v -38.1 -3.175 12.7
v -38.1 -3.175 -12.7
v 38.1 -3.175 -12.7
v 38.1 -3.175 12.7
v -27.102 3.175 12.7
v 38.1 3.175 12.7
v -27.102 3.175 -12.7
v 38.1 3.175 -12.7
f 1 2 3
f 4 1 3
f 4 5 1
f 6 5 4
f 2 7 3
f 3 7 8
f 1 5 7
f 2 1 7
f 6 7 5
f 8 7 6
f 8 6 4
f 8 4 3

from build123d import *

# Parameters (mm, degrees)
SKETCH1_W           = 76.2
SKETCH1_H           = 25.4
BOSS_EXTRUDE1_DEPTH = 3.175
CHAMFER8_SIZE2      = 10.998522628
CHAMFER8_SIZE       = 6.35


with BuildPart() as part:
    # Sketch1 → Boss-Extrude1 (new, symmetric)
    with BuildSketch(Plane(origin=(0, 0, 0), x_dir=(1, 0, 0), z_dir=(0, 1, 0))):
        Rectangle(SKETCH1_W, SKETCH1_H)
    extrude(amount=BOSS_EXTRUDE1_DEPTH, both=True)

    # Chamfer8
    chamfer8_edges = [part.edges().sort_by_distance(p)[0] for p in [
        (-38.1, 3.175, 0),
    ]]
    chamfer8_side = [part.faces().sort_by_distance(p)[0] for p in [
        (-38.1, 3.048, 0),
    ]]
    chamfer(chamfer8_edges, length=CHAMFER8_SIZE - 0.0001, length2=CHAMFER8_SIZE2 - 0.0001, reference=chamfer8_side[0])  # a hair under: the kernel refuses the full size


solid = part.part
